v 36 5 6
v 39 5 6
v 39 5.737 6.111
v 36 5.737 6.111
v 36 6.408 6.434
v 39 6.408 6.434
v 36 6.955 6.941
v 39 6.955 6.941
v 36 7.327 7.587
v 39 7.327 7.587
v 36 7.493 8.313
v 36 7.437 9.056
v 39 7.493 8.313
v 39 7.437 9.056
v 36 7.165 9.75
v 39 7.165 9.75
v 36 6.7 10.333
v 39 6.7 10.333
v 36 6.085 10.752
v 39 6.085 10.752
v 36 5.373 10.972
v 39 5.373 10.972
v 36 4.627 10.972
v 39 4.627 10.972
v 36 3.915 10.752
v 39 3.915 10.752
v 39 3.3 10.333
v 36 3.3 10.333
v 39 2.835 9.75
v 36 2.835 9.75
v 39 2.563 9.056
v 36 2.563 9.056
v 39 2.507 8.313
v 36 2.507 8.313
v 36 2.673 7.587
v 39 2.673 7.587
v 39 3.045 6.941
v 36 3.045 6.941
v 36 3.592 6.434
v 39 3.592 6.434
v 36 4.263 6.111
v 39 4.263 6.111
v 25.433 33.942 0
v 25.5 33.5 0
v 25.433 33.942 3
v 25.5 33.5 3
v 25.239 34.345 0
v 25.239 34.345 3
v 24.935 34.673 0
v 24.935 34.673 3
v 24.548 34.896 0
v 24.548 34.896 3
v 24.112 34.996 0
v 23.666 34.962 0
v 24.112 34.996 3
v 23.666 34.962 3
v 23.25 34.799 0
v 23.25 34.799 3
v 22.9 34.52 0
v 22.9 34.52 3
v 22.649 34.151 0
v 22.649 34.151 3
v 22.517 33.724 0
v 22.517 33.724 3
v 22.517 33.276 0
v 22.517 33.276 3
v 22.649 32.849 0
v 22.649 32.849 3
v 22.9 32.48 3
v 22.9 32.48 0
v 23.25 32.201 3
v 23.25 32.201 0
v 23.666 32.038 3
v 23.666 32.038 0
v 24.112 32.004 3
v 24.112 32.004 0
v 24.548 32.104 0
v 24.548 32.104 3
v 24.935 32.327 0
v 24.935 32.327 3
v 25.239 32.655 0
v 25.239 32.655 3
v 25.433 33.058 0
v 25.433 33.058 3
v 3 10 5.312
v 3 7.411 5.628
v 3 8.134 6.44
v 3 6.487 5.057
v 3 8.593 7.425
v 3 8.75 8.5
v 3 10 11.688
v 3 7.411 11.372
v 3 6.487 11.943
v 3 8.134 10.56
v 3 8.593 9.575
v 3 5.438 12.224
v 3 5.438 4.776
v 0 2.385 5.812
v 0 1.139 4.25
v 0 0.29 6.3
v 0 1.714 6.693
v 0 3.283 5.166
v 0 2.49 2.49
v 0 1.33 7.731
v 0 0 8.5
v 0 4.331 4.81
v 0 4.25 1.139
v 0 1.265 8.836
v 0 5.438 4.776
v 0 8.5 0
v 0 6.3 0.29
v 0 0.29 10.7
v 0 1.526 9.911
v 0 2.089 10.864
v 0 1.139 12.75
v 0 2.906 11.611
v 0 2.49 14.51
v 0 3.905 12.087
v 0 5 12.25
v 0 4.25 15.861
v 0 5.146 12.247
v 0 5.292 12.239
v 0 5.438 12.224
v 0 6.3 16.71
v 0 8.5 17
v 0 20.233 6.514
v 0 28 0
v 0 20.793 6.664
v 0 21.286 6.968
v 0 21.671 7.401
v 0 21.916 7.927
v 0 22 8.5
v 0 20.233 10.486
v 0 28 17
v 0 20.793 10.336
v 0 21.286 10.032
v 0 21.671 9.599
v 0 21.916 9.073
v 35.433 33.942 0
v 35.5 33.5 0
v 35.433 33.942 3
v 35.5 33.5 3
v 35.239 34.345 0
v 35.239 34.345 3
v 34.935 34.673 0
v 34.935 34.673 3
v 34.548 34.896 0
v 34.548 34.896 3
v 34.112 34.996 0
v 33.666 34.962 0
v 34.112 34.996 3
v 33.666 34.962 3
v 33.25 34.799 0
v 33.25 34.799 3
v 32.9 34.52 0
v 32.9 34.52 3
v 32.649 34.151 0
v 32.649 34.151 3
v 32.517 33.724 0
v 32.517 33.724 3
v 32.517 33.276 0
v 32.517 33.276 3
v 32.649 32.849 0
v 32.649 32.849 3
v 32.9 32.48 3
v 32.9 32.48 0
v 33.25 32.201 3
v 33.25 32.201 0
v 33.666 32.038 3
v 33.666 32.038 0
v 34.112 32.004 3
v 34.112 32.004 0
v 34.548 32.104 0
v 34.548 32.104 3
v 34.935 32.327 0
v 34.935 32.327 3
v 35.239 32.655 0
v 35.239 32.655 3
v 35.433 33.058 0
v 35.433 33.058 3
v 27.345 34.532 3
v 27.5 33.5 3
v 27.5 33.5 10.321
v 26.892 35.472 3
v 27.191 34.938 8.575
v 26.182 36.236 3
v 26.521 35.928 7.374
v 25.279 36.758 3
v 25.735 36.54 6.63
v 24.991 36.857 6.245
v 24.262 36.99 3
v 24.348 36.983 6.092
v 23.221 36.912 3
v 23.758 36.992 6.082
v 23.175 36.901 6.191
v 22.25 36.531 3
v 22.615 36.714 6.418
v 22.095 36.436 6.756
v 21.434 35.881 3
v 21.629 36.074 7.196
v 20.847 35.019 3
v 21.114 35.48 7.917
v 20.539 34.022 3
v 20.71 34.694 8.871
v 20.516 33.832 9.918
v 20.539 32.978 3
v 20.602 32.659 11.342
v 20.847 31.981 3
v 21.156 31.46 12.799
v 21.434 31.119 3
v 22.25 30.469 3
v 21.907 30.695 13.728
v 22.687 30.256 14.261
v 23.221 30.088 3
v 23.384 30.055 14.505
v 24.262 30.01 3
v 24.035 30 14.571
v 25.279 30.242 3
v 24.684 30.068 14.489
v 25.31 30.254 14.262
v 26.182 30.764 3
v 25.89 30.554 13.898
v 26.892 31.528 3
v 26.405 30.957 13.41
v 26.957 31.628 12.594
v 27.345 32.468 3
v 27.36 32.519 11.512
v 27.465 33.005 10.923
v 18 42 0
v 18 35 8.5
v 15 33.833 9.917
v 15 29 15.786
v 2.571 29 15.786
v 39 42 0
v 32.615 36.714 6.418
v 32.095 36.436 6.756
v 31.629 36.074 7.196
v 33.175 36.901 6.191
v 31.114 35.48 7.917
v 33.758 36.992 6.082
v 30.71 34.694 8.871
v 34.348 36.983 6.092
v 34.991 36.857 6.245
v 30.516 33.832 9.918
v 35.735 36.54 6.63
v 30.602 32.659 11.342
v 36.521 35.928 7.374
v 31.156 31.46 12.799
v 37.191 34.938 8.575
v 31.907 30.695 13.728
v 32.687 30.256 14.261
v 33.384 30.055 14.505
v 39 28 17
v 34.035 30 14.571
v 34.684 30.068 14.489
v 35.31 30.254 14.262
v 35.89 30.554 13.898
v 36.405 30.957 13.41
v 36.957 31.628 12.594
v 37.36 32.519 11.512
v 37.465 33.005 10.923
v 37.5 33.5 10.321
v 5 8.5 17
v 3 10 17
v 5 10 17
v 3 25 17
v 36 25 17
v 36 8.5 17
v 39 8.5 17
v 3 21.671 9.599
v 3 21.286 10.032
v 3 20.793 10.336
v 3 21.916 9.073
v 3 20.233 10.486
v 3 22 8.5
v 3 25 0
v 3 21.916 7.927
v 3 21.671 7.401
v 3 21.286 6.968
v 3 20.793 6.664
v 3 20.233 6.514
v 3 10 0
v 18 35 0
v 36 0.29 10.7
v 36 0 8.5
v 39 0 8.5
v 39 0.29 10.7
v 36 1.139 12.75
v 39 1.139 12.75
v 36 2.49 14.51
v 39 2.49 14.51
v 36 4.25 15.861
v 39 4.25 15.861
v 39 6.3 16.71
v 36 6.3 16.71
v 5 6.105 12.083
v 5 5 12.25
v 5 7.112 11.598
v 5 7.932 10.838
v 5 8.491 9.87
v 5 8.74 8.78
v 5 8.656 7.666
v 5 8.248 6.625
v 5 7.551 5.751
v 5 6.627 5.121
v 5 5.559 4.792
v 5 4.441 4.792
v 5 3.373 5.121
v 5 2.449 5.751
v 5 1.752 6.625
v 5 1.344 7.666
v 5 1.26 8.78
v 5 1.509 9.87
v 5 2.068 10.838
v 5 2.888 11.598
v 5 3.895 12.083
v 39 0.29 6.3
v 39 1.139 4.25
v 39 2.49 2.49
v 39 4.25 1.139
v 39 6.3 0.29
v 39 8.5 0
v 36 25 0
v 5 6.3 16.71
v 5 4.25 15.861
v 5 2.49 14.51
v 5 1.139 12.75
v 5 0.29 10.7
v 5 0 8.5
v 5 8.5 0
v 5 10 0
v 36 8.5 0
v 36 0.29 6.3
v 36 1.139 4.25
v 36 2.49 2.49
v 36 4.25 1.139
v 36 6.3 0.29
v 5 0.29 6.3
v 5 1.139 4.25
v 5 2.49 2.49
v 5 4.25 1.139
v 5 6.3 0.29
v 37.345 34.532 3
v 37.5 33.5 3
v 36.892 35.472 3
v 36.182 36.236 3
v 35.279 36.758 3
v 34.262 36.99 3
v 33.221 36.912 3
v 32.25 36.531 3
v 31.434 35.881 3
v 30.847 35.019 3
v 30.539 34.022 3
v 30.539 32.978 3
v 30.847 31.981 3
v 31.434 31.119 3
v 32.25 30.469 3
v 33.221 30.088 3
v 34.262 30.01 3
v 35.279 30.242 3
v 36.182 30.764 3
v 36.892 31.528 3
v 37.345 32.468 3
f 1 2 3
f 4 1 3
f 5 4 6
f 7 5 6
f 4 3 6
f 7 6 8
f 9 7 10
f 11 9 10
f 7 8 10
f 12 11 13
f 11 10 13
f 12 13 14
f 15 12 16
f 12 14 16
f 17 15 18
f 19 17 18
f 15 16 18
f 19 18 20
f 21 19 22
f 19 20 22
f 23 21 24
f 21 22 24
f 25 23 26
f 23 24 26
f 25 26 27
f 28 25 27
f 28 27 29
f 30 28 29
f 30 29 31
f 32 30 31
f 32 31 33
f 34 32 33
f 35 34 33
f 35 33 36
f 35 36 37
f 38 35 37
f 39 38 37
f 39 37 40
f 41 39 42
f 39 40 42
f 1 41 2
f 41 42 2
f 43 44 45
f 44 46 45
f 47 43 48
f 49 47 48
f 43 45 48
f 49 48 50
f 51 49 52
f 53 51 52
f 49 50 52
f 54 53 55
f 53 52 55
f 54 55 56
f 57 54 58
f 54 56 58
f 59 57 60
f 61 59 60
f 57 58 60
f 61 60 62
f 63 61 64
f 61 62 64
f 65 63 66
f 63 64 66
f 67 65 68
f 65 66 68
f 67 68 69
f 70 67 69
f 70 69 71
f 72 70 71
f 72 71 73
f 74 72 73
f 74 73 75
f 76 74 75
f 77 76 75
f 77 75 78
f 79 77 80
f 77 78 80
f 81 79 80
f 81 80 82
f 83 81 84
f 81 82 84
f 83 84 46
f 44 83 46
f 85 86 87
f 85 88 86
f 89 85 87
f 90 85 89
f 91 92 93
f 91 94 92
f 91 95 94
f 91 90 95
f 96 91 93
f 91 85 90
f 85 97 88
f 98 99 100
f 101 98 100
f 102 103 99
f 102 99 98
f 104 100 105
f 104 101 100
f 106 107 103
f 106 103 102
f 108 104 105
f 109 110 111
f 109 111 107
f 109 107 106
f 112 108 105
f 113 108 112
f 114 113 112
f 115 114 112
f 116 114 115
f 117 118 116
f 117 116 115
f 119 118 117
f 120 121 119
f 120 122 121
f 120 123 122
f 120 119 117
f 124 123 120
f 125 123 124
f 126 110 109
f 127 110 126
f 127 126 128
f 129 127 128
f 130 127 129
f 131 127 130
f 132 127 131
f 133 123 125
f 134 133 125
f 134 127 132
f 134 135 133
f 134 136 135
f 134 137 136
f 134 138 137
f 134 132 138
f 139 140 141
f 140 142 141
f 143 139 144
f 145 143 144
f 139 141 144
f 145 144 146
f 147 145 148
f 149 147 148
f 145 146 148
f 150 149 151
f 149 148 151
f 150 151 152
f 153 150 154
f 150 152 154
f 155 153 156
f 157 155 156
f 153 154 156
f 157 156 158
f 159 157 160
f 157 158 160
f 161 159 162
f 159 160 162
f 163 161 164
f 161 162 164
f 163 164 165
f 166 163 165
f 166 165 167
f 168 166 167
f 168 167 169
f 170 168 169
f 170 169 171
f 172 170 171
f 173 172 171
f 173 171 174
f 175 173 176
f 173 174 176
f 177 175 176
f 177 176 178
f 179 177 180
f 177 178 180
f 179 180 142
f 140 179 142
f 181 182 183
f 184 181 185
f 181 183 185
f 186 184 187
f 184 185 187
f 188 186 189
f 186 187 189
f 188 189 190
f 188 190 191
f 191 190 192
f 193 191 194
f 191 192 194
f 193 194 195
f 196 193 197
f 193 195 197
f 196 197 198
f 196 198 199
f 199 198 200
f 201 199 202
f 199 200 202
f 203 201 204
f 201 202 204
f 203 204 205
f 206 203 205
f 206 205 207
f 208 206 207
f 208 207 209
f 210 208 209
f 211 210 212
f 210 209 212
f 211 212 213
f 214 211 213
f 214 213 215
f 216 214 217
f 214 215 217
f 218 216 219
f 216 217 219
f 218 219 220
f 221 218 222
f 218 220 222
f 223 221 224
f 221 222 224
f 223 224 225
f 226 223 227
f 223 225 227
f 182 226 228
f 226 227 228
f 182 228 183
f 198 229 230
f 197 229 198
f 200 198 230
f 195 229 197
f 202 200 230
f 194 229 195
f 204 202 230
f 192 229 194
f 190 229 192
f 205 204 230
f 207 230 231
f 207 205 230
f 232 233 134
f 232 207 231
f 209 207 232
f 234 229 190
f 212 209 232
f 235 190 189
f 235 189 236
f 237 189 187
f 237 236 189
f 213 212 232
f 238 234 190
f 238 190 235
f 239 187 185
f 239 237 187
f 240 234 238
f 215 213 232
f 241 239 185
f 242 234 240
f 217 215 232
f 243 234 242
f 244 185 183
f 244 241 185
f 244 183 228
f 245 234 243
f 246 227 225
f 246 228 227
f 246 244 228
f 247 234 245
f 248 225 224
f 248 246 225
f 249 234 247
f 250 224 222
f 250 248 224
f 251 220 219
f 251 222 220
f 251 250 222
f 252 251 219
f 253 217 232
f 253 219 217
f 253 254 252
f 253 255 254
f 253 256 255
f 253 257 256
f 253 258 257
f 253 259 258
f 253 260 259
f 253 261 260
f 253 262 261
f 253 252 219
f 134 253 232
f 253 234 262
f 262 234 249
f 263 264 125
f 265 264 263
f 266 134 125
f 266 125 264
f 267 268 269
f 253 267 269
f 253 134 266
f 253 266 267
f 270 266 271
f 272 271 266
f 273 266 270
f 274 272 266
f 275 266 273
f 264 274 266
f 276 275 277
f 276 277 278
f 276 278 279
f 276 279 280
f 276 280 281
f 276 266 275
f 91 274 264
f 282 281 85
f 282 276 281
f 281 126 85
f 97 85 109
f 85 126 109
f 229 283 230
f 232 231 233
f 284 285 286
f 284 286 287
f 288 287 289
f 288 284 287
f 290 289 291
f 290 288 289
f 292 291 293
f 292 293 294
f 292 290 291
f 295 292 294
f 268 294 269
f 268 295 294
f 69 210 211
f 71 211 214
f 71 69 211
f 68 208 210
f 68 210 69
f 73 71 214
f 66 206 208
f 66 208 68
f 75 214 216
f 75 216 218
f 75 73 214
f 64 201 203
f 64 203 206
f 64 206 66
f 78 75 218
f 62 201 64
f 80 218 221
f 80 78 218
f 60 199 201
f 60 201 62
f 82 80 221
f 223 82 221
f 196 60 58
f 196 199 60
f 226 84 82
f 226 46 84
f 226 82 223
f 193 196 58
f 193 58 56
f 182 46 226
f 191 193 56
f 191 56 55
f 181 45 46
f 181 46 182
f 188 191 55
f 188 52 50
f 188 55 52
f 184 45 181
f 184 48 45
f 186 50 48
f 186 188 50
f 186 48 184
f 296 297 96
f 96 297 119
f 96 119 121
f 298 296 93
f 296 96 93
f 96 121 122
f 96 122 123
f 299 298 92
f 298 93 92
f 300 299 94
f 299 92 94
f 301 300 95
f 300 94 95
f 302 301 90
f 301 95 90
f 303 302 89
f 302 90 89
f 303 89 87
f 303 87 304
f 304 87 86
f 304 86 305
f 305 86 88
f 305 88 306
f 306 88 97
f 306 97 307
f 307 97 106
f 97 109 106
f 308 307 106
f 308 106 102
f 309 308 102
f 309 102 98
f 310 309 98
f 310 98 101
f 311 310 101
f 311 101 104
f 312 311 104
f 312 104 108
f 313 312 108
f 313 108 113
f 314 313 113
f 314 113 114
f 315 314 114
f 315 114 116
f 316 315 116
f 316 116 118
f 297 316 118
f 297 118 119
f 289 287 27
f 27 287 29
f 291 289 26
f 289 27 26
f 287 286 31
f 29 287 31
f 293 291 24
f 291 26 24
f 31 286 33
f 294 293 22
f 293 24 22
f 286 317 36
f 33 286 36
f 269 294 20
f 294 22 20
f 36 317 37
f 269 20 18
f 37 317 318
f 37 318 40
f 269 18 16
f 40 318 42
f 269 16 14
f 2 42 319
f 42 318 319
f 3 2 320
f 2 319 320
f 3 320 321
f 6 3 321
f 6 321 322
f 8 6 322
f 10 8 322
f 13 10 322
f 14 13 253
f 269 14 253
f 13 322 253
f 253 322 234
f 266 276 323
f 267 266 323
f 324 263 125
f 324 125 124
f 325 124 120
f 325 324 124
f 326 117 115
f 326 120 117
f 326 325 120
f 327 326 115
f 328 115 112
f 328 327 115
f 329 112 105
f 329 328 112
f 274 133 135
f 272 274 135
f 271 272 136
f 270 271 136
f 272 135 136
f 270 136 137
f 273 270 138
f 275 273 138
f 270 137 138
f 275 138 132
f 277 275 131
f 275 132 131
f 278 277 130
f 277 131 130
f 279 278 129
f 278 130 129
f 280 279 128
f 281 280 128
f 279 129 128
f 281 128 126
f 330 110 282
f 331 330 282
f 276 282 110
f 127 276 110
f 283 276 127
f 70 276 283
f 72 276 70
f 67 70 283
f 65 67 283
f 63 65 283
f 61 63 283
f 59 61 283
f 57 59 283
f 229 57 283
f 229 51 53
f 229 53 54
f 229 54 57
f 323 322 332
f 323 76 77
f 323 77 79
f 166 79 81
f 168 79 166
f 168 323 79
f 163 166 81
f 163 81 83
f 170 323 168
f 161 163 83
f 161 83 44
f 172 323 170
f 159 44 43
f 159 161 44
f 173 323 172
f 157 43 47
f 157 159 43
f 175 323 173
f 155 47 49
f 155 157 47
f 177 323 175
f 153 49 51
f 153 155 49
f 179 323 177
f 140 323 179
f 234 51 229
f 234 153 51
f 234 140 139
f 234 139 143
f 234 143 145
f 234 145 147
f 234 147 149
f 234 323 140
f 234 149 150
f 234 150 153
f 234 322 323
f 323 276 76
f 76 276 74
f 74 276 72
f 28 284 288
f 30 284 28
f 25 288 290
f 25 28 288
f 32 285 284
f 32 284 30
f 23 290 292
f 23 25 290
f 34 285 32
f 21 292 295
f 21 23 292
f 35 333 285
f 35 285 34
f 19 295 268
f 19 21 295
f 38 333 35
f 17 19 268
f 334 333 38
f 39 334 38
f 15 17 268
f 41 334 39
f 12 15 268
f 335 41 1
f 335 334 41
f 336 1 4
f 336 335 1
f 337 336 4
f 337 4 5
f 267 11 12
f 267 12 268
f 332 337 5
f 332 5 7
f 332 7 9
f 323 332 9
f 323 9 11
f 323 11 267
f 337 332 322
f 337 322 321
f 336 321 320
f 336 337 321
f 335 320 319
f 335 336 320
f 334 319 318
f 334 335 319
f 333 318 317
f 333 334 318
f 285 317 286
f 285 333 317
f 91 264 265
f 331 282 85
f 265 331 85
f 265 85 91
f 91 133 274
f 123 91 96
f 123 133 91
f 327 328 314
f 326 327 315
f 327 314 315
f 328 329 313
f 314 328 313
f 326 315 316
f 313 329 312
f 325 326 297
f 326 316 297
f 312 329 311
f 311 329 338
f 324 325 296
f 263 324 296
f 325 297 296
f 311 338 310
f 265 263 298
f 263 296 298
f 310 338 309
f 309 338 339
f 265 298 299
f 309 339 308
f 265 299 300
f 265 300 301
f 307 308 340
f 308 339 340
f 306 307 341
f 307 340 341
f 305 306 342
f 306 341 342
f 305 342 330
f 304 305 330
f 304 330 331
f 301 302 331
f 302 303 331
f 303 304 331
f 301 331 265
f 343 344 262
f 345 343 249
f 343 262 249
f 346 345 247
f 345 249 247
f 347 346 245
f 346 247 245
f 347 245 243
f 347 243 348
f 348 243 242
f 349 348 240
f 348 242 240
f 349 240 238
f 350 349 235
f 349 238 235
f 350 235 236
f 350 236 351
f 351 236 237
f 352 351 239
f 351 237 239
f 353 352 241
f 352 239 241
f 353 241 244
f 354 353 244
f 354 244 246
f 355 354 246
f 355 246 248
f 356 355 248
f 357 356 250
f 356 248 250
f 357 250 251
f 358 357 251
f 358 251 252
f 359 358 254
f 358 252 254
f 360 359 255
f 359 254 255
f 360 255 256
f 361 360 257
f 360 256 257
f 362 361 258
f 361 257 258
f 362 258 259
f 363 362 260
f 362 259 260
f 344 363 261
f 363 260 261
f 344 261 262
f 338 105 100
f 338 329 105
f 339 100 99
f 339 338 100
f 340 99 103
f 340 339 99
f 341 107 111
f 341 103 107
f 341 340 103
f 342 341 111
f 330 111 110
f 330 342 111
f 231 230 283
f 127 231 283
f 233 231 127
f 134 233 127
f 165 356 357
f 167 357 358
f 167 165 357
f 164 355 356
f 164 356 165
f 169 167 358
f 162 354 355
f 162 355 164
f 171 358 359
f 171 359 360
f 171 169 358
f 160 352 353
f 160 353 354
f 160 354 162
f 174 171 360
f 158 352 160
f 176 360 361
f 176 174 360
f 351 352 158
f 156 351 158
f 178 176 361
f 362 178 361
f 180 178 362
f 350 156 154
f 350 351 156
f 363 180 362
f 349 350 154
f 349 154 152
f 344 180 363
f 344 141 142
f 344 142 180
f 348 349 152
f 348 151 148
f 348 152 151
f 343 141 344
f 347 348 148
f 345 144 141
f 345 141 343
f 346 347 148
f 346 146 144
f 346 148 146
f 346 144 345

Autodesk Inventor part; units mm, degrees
ref_plane "YZ Plane" through (0, 0, 0) normal (1, 0, 0) x (0, 1, 0)
ref_plane "XZ Plane" through (0, 0, 0) normal (0, 1, 0) x (-1, 0, 0)
ref_plane "XY Plane" through (0, 0, 0) normal (0, 0, 1) x (1, 0, 0)
sketch "Sketch1" plane through (0, 0, 0) normal (0, 0, 1) x (1, 0, 0)
  line L0 (0, 0) -> (5, 0)
  line L1 (5, 0) -> (5, 25)
  line L2 (5, 25) -> (0, 25)
  line L3 (0, 25) -> (0, 0)
  line L4 (36, 25) -> (39, 25)
  line L5 (39, 25) -> (39, 0)
  line L6 (39, 0) -> (36, 0)
  line L7 (36, 0) -> (36, 25)
  line L8 (0, 25) -> (39, 25)
  line L9 (39, 25) -> (39, 42)
  line L10 (39, 42) -> (0, 42)
  line L11 (0, 42) -> (0, 25)
  line L12 (5, 25) -> (3, 25)
  line L13 (3, 25) -> (3, 10)
  line L14 (3, 10) -> (5, 10)
  line L15 (5, 10) -> (5, 25)
  dimension "d0" = 5
  dimension "d1" = 25
  dimension "d2" = 3
  dimension "d3" = 25
  dimension "d4" = 31
  dimension "d6" = 17
  dimension "d48" = 0
  dimension "d54" = 2
  dimension "d55" = 15
extrude "Extrusion1" add sketch "Sketch1" along normal blind 17 contours L3 L2 L13 L14 L1 L0 | L11 L10 L9 L4 L8 L2 | L4 L5 L6 L7
sketch "Sketch2" plane through (39, 0, 0) normal (1, 0, 0) x (0, 0, -1)
  line L0 (-17, 28) -> (-17, 42)
  line L1 (0, 42) -> (-17, 42) projected
  line L2 (-17, 42) -> (0, 42)
  line L3 (0, 42) -> (-17, 28)
  point P0 (0, 0)
  dimension "d9" = 14
extrude "Extrusion2" cut sketch "Sketch2" against normal up to surface (39 mm away)
sketch "Sketch3" plane through (0, 0, 0) normal (0, 0, -1) x (-1, 0, 0)
  line L0 (0, 42) -> (0, 0) projected
  line L1 (0, 42) -> (-15, 42)
  line L2 (-15, 42) -> (-15, 29)
  line L3 (-15, 29) -> (0, 29)
  line L4 (0, 29) -> (0, 42)
  point P0 (0, 29)
  dimension "d12" = 15
  dimension "d13" = 13
extrude "Extrusion3" cut sketch "Sketch3" against normal up to surface (17 mm away)
sketch "Sketch4" plane through (0, 0, 17) normal (0, 0, 1) x (1, 0, 0)
  line L0 (39, 0) -> (39, 42) projected
  line L1 (39, 42) -> (19, 42)
  line L2 (19, 42) -> (19, 25)
  line L3 (19, 25) -> (39, 25)
  line L4 (39, 25) -> (39, 42)
  circle A0 centre (34, 33.5) radius 3.5
  circle A1 centre (24, 33.5) radius 3.5
  point P0 (0, 0)
  dimension "d16" = 20
  dimension "d17" = 17
  dimension "d18" = 7
  dimension "d19" = 7
  dimension "d20" = 8.5
  dimension "d21" = 5
  dimension "d22" = 8.5
  dimension "d23" = 5
extrude "Extrusion4" cut sketch "Sketch4" against normal blind 14 contours A0 | A1
sketch "Sketch5" plane through (0, 0, 3) normal (0, 0, 1) x (1, 0, 0)
  circle A0 centre (34, 33.5) radius 3.5 projected
  circle A1 centre (34, 33.5) radius 1.5
  circle A2 centre (24, 33.5) radius 3.5 projected
  circle A3 centre (24, 33.5) radius 1.5
  point P0 (0, 0)
  point P1 (32.4191, 39.5294)
  point P2 (27.5809, 39.5294)
  point P3 (22.4191, 39.5294)
  point P4 (17.5809, 39.5294)
  dimension "d26" = 3
  dimension "d27" = 3
extrude "Extrusion5" cut sketch "Sketch5" against normal up to surface (3 mm away) contours A1 | A3
sketch "Sketch6" plane through (15, 29, 0) normal (-1, 0, 0) x (0, 0, 1)
  line L0 (0, 0) -> (15.7857, 0) projected
  line L1 (0, 13) -> (15.7857, 0)
  line L2 (15.7857, 0) -> (0, 0)
  line L3 (0, 0) -> (0, 13)
  line L4 (0, 0) -> (0, 13) projected
  point P0 (0, -29)
extrude "Extrusion6" add sketch "Sketch6" along normal up to surface (15 mm away)
sketch "Sketch7" plane through (0, 0, 17) normal (0, 0, 1) x (1, 0, 0)
  line L0 (39, 28) -> (0, 28) projected
  line L1 (0, 28) -> (18, 28)
  line L2 (18, 28) -> (18, 35)
  line L3 (18, 35) -> (0, 28)
  line L4 (18, 35) -> (18, 42)
  line L5 (0, 28) -> (0, 42) projected
  line L6 (18, 42) -> (0, 42)
  line L7 (0, 42) -> (0, 28)
  point P0 (0, 0)
  dimension "d32" = 18
  dimension "d33" = 7
  dimension "d34" = 7
extrude "Extrusion7" cut sketch "Sketch7" against normal up to surface (17 mm away) contours L5 L6 L4 L3
sketch "Sketch8" plane through (0, 0, 0) normal (-1, 0, 0) x (0, 0, 1)
  circle A0 centre (8.5, 5) radius 3.75
  line L0 (0, 0) -> (17, 0) projected
  line L1 (17, 28) -> (17, 0) projected
  dimension "d37" = 7.5
  dimension "d38" = 5
  dimension "d39" = 8.5
extrude "Extrusion8" cut sketch "Sketch8" against normal up to surface (5 mm away)
sketch "Sketch9" plane through (39, 0, 17) normal (1, 0, 0) x (0, 0, -1)
  circle A0 centre (8.5, 5) radius 2.5
  line L0 (17, 0) -> (0, 0) projected
  line L1 (0, 0) -> (0, 28) projected
  dimension "d42" = 5
  dimension "d43" = 5
  dimension "d44" = 8.5
extrude "Extrusion9" cut sketch "Sketch9" against normal up to surface (3 mm away)
fillet "Fillet1" radius 8.5 4 edges at (2.5, 0, 17) (37.5, 0, 17) (37.5, 0, 0) (2.5, 0, 0)
sketch "Sketch10" plane through (0, 28, 0) normal (-1, 0, 0) x (0, 0, 1)
  circle A0 centre (8.5, -8) radius 2
  circle A1 centre (8.5, -23) radius 3.75
  line L0 (10.4863, -7.7667) -> (12.2244, -22.5625)
  line L1 (6.5137, -7.7667) -> (4.7756, -22.5625)
  circle A2 centre (8.5, -23) radius 3.75 projected
  circle A3 centre (8.5, -23) radius 3.5
  point P0 (0, -28)
  dimension "d49" = 4
  dimension "d50" = 15
  dimension "d51" = 0
extrude "Extrusion10" cut sketch "Sketch10" against normal blind 3 contours A0 | A0 L0 A1 L1
properties part number "juncao7"
